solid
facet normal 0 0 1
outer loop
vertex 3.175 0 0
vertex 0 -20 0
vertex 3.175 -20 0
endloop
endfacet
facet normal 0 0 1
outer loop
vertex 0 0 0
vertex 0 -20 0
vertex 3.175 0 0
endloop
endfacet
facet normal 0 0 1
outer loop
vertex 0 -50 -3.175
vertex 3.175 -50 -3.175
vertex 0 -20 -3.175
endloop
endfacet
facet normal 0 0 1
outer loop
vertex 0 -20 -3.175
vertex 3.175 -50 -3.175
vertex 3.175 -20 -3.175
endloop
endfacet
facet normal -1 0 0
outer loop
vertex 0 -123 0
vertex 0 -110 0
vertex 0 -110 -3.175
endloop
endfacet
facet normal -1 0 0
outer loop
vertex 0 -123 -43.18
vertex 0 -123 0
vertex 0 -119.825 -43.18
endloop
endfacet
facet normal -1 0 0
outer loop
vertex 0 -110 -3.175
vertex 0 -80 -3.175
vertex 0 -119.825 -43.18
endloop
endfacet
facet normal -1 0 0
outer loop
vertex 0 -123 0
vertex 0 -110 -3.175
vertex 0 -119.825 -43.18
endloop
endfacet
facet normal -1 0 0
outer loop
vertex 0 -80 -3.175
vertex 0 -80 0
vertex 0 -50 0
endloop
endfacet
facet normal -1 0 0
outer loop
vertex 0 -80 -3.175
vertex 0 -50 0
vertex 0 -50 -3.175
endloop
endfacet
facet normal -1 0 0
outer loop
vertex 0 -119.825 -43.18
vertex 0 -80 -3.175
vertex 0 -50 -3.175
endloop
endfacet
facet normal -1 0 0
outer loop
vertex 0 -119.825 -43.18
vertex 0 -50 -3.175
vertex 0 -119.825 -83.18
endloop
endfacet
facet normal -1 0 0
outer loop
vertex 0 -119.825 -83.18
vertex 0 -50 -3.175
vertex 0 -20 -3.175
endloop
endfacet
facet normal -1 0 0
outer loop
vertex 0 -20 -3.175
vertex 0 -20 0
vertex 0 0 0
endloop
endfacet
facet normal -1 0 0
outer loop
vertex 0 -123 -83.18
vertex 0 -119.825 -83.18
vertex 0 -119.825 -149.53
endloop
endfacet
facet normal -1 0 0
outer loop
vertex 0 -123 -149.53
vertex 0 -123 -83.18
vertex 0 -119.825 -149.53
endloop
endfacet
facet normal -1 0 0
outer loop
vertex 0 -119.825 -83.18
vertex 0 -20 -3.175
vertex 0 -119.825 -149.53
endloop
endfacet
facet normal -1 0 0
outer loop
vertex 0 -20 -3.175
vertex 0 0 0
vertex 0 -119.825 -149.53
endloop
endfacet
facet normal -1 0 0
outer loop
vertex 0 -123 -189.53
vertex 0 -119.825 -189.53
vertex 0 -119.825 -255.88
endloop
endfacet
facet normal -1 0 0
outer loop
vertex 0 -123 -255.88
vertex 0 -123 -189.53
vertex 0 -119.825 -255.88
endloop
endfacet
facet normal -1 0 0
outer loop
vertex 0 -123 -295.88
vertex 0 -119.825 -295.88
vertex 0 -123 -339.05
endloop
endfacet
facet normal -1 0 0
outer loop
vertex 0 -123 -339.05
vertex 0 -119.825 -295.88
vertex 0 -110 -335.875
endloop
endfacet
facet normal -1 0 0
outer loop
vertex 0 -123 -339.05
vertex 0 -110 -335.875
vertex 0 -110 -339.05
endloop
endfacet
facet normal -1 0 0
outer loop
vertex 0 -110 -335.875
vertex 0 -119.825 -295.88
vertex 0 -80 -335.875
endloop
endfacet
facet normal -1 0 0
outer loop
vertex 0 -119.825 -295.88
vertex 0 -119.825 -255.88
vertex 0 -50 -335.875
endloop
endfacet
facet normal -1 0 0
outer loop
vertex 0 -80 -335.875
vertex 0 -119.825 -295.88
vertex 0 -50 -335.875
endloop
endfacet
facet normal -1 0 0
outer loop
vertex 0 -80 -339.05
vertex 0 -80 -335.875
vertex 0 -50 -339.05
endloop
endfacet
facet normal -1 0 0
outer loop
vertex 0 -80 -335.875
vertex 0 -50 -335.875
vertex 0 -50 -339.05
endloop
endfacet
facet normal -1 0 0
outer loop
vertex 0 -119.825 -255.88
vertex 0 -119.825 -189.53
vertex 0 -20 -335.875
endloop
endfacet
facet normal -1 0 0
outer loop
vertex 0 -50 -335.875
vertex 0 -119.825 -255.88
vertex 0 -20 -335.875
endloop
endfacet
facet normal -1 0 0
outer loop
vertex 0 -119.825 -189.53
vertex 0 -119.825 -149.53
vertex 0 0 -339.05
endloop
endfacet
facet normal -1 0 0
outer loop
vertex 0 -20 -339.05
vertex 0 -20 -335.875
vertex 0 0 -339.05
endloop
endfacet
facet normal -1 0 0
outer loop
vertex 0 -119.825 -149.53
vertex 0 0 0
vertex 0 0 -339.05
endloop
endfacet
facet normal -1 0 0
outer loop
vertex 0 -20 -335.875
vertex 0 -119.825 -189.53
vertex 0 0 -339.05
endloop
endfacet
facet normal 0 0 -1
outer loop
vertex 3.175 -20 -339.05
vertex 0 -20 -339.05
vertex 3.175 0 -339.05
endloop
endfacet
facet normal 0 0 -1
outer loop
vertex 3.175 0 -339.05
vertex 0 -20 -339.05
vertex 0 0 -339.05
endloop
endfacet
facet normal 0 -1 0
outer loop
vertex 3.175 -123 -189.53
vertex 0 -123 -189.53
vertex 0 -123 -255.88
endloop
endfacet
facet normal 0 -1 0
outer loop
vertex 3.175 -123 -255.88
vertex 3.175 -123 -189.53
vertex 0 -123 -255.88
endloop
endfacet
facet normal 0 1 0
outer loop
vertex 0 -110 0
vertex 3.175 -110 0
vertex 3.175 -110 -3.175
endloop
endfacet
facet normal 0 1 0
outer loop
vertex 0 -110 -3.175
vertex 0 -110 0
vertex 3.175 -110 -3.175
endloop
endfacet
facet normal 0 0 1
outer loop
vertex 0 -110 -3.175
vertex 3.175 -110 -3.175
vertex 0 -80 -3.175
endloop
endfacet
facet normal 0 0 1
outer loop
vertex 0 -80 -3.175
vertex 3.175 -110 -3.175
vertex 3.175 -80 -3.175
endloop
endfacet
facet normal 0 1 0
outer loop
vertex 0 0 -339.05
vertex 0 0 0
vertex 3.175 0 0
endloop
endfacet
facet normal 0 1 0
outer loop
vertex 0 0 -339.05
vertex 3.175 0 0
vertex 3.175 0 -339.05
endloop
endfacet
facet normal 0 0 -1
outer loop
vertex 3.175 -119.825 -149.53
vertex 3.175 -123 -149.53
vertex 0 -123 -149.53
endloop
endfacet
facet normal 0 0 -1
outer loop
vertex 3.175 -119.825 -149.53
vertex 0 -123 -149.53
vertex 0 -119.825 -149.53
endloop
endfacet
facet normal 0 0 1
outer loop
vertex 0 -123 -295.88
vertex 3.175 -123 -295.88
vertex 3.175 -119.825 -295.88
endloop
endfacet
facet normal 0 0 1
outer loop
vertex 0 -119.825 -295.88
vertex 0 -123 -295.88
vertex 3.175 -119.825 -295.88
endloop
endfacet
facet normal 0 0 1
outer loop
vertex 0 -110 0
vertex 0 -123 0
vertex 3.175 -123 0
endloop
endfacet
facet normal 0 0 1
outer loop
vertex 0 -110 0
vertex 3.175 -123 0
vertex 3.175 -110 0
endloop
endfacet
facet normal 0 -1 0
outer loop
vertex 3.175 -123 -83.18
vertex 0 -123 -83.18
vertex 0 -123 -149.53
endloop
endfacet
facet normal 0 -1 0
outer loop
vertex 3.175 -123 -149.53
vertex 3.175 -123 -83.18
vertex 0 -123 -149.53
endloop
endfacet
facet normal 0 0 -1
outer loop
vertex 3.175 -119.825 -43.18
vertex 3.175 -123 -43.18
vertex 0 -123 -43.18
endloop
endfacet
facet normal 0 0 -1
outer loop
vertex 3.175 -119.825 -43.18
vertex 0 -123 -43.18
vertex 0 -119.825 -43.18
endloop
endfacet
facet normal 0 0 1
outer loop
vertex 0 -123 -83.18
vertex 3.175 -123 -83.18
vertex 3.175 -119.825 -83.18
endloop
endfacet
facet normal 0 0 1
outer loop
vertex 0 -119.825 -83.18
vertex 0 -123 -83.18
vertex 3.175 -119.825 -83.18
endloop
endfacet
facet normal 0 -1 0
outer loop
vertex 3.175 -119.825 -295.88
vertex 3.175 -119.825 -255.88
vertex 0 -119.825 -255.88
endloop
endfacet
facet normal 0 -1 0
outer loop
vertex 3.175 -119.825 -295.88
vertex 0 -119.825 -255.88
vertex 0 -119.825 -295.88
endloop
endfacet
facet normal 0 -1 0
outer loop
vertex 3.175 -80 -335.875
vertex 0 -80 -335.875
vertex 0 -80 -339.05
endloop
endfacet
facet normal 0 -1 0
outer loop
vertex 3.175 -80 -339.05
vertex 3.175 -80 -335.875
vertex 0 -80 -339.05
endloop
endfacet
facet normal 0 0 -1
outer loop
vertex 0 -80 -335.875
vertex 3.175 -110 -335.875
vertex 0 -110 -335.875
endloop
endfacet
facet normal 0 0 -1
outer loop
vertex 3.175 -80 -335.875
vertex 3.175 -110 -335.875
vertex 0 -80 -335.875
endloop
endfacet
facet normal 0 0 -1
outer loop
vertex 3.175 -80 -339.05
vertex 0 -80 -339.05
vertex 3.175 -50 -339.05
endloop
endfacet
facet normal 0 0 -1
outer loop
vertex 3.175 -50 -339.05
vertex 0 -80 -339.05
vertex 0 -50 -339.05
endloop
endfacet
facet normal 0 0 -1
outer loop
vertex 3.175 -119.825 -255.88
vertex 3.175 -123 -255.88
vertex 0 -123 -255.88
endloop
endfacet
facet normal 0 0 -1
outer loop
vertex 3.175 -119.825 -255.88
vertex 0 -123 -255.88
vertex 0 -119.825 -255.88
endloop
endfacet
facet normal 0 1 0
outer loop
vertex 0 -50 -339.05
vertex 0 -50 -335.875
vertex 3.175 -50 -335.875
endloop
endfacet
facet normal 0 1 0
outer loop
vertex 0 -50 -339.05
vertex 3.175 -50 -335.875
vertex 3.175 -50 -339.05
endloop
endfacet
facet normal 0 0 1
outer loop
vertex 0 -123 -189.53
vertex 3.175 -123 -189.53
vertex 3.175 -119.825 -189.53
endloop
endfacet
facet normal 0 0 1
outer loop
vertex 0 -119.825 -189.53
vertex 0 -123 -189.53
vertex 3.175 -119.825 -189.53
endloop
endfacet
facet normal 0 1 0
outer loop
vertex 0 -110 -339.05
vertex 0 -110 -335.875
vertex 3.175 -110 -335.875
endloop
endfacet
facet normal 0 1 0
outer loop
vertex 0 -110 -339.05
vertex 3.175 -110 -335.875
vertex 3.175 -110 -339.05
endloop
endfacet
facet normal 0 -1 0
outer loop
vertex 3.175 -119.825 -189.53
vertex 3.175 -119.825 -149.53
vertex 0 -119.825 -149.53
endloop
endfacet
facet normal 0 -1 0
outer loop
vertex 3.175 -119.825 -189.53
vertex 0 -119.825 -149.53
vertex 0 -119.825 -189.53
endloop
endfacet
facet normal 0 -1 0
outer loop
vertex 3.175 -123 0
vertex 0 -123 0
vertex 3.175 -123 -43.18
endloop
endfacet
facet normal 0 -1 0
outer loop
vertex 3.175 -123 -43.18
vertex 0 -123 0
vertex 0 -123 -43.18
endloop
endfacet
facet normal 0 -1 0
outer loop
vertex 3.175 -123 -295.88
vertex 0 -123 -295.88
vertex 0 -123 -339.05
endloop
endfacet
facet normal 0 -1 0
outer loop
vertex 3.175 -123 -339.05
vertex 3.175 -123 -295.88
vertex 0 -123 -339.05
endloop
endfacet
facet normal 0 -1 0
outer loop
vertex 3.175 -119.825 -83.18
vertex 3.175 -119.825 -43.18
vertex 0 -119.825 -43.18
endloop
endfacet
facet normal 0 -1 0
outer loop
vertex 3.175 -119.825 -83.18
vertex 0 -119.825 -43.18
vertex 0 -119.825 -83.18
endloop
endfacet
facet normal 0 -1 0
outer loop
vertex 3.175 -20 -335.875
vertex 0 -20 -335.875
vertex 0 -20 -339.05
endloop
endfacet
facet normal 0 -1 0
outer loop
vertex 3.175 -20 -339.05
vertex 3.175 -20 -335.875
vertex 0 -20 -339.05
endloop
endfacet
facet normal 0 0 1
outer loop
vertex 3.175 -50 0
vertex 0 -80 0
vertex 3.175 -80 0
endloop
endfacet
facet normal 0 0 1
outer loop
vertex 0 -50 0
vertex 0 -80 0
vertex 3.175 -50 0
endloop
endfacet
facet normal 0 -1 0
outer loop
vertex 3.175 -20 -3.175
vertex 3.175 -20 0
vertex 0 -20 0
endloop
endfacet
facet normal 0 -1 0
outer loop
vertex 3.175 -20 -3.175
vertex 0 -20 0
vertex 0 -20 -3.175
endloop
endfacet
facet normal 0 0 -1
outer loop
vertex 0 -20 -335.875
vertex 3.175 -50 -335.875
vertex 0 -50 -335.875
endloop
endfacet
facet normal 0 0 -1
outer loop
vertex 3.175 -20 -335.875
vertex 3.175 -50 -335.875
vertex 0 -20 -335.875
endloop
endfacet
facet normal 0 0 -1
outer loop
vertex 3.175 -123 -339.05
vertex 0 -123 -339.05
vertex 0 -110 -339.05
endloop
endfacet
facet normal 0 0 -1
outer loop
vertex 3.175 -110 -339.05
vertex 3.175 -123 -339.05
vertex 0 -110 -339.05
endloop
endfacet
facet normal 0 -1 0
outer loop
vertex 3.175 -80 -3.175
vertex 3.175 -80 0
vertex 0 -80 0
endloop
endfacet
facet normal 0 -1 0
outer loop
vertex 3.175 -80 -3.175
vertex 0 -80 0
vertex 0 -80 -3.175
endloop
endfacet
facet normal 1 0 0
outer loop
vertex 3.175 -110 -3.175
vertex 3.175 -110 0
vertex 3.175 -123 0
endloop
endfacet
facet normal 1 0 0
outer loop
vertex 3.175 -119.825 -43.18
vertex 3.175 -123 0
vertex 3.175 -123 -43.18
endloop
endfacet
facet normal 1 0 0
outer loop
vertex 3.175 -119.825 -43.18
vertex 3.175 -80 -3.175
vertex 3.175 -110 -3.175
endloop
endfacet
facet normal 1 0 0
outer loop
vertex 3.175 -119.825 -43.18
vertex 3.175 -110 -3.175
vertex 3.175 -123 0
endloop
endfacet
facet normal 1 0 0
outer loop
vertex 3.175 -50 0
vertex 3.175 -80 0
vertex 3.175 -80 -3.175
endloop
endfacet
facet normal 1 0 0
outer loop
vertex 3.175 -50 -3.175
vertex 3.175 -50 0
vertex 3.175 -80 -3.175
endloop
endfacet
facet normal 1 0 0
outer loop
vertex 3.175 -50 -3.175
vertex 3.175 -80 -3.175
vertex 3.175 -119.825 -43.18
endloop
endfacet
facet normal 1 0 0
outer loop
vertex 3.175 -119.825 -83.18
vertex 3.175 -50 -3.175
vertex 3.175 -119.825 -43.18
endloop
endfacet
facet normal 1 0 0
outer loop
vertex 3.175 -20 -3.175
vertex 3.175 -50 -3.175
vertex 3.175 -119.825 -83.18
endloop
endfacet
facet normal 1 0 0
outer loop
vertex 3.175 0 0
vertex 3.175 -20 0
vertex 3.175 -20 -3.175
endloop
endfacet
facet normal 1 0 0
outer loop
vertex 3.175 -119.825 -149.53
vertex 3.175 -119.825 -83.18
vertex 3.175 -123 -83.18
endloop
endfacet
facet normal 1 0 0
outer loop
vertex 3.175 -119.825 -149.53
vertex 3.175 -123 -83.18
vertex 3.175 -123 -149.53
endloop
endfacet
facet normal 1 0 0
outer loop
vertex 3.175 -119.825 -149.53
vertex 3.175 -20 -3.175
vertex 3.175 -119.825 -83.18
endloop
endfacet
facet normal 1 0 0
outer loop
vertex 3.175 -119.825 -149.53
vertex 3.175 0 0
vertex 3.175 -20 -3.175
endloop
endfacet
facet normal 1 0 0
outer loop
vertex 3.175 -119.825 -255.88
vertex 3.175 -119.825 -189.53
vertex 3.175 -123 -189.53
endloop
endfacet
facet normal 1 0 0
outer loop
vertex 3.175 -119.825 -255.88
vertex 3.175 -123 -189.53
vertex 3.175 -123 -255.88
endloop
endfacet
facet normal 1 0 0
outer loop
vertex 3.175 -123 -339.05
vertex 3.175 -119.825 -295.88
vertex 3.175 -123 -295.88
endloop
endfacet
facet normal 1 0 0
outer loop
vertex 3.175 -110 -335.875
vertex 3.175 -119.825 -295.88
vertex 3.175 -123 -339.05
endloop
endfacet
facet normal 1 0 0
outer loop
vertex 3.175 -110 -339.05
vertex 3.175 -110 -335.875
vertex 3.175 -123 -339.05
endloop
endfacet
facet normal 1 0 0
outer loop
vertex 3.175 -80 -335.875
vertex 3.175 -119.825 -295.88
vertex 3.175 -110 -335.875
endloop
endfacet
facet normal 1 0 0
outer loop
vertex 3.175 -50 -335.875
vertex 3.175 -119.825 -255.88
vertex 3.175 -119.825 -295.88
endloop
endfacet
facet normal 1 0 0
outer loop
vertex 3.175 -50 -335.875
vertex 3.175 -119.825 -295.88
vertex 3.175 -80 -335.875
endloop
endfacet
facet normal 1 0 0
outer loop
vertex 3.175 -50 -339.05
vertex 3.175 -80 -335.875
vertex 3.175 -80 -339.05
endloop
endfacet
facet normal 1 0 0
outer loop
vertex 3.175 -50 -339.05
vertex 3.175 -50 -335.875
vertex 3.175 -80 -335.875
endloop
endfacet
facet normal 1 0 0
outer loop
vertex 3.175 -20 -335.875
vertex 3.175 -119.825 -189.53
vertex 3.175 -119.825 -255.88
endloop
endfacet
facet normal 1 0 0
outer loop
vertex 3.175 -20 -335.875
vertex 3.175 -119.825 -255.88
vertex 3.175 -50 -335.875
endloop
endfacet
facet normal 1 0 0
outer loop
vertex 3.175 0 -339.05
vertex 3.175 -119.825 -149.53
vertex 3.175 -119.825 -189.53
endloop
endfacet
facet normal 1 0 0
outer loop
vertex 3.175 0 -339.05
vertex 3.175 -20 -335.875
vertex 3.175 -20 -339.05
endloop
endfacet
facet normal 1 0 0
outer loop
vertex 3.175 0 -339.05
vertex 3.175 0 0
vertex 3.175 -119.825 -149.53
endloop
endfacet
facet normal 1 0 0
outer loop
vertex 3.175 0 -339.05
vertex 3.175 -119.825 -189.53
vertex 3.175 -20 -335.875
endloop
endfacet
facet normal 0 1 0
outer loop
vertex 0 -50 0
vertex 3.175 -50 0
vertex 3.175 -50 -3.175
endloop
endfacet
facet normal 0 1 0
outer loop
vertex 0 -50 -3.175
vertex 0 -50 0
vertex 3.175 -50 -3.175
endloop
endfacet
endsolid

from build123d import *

# Parameters (mm, degrees)
SKETCH1_W           = 339.05
SKETCH1_H           = 123
BOSS_EXTRUDE1_DEPTH = 3.175
SKETCH2_W           = 3.175
SKETCH2_H           = 30
CUT_EXTRUDE1_DEPTH  = 10
SKETCH3_W           = 40
SKETCH3_H           = 3.175
CUT_EXTRUDE2_DEPTH  = 361.685435144
LPATTERN1_COUNT     = 3
LPATTERN1_PITCH     = 106.35


with BuildPart() as part:
    # Sketch1 → Boss-Extrude1 (new body)
    with BuildSketch(Plane(origin=(0, 0, 0), x_dir=(0, 0, -1), z_dir=(1, 0, 0))):
        with Locations((169.525, -61.5)):
            Rectangle(SKETCH1_W, SKETCH1_H)
    extrude(amount=BOSS_EXTRUDE1_DEPTH)

    # Sketch2 → Cut-Extrude1 (cut)
    with BuildSketch(Plane(origin=(3.175, 0, 0), x_dir=(0, 0, -1), z_dir=(1, 0, 0))):
        with Locations((337.4625, -35)):
            Rectangle(SKETCH2_W, SKETCH2_H)
        with Locations((337.4625, -95)):
            Rectangle(SKETCH2_W, SKETCH2_H)
        with Locations((1.5875, -35)):
            Rectangle(SKETCH2_W, SKETCH2_H)
        with Locations((1.5875, -95)):
            Rectangle(SKETCH2_W, SKETCH2_H)
    extrude(amount=-CUT_EXTRUDE1_DEPTH, mode=Mode.SUBTRACT)

    # Sketch3 → Cut-Extrude2 (cut, through all)
    with BuildSketch(Plane(origin=(3.175, 0, 0), x_dir=(0, 0, -1), z_dir=(1, 0, 0))):
        with Locations((63.18, -121.4125)):
            Rectangle(SKETCH3_W, SKETCH3_H)
    cut_extrude2 = extrude(amount=-CUT_EXTRUDE2_DEPTH, mode=Mode.SUBTRACT)

    # LPattern1: Cut-Extrude2 ×3
    with Locations(*[(0, 0, -i * LPATTERN1_PITCH) for i in range(1, LPATTERN1_COUNT)]):
        add(cut_extrude2, mode=Mode.SUBTRACT)


solid = part.part
